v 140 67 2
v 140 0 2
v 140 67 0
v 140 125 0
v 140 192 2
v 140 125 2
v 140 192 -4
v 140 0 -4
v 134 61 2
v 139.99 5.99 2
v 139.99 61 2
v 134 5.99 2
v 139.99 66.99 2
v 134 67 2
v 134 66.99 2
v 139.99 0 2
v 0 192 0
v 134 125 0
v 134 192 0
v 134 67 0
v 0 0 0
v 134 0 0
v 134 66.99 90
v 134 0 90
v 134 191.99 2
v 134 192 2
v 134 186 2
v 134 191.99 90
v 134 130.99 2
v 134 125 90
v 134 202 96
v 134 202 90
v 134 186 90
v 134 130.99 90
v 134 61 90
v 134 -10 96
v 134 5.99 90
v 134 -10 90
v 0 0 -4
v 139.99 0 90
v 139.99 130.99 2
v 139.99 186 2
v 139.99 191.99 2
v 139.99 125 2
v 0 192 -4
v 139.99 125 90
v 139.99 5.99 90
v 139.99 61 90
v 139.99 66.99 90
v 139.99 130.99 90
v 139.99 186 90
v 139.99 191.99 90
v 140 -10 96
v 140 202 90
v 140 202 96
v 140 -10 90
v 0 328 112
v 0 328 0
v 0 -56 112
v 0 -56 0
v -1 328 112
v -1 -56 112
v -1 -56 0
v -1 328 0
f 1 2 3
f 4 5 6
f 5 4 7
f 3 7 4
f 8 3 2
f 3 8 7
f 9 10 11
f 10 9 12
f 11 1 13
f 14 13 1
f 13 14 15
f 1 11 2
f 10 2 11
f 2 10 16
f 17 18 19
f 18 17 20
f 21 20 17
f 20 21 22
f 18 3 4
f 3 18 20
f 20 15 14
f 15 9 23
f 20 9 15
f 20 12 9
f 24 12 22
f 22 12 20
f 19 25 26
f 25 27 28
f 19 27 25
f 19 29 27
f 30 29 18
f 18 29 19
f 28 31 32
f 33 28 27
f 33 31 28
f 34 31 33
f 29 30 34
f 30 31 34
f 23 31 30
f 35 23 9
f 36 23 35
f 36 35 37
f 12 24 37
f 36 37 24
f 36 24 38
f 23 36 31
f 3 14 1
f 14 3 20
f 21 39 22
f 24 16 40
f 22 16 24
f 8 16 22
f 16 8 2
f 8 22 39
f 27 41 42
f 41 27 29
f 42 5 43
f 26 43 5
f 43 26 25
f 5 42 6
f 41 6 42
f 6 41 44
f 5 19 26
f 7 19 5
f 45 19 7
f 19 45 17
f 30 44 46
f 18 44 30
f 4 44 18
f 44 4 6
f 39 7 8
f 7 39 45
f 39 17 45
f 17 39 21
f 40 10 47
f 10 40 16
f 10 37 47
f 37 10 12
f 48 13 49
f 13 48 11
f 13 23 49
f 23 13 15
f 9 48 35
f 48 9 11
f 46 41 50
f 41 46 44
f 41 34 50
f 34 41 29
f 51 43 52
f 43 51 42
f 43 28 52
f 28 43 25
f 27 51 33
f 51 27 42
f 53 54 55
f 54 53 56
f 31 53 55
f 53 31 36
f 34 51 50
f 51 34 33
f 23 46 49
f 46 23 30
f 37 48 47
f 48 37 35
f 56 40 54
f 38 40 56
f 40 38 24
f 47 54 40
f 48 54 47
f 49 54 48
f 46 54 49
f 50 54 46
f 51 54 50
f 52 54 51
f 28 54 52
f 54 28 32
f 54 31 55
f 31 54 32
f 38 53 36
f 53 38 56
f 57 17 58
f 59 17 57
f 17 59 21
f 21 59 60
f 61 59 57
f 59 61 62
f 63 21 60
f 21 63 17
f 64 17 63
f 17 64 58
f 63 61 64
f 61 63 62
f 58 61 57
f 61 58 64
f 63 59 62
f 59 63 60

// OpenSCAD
// everything is in inches

//create a block
module block(height, width, depth) 
{
	scale([height,width,depth]) //scale
	{
			//make a cube
			cube([1,1,1]); 
	}
}

slab_w = 192;
slab_h = 140;
slab_d = 4;
post_h = 96;
post_hr = 95.99;
post_w = 6;
post_wr = 5.99;
base_h = 2;
post_slab_edge_offset = 0;
horizontal_post_overlap = 10;
house_wall_h = 112;
house_wall_d = 1;

// create 2 by 6 as a base
color("green")translate([slab_h-post_w,0,0])block(post_w, slab_w/3 + post_w / 2, base_h); 
color("green")translate([slab_h-post_w,slab_w*2/3-post_w/2,0])block(post_w, slab_w/3 + post_w / 2, base_h); 

// create slab and 3 main posts
color("grey")translate([0,0,-slab_d])block(slab_h, slab_w, slab_d); 
color("yellow")translate([slab_h-post_slab_edge_offset-post_w,post_slab_edge_offset,0])block(post_wr, post_wr, post_hr); 
color("yellow")translate([slab_h-post_slab_edge_offset-post_w,slab_w/3-post_w/2,0])block(post_wr, post_wr, post_hr); 
color("yellow")translate([slab_h-post_slab_edge_offset-post_w,slab_w/3*2-post_w/2,0])block(post_wr, post_wr, post_hr); 
color("yellow")translate([slab_h-post_slab_edge_offset-post_w,slab_w - post_w-post_slab_edge_offset,0])block(post_wr, post_wr, post_hr); 

//create horizontal post on top of three main posts
color("brown")translate([slab_h-post_slab_edge_offset-post_w,-horizontal_post_overlap,post_h-post_w])block(post_w, slab_w+horizontal_post_overlap*2, post_w); 
//create wall of the house
color("red")translate([-house_wall_d, -house_wall_h * 0.5, 0])block(house_wall_d, slab_w*2, house_wall_h); 
